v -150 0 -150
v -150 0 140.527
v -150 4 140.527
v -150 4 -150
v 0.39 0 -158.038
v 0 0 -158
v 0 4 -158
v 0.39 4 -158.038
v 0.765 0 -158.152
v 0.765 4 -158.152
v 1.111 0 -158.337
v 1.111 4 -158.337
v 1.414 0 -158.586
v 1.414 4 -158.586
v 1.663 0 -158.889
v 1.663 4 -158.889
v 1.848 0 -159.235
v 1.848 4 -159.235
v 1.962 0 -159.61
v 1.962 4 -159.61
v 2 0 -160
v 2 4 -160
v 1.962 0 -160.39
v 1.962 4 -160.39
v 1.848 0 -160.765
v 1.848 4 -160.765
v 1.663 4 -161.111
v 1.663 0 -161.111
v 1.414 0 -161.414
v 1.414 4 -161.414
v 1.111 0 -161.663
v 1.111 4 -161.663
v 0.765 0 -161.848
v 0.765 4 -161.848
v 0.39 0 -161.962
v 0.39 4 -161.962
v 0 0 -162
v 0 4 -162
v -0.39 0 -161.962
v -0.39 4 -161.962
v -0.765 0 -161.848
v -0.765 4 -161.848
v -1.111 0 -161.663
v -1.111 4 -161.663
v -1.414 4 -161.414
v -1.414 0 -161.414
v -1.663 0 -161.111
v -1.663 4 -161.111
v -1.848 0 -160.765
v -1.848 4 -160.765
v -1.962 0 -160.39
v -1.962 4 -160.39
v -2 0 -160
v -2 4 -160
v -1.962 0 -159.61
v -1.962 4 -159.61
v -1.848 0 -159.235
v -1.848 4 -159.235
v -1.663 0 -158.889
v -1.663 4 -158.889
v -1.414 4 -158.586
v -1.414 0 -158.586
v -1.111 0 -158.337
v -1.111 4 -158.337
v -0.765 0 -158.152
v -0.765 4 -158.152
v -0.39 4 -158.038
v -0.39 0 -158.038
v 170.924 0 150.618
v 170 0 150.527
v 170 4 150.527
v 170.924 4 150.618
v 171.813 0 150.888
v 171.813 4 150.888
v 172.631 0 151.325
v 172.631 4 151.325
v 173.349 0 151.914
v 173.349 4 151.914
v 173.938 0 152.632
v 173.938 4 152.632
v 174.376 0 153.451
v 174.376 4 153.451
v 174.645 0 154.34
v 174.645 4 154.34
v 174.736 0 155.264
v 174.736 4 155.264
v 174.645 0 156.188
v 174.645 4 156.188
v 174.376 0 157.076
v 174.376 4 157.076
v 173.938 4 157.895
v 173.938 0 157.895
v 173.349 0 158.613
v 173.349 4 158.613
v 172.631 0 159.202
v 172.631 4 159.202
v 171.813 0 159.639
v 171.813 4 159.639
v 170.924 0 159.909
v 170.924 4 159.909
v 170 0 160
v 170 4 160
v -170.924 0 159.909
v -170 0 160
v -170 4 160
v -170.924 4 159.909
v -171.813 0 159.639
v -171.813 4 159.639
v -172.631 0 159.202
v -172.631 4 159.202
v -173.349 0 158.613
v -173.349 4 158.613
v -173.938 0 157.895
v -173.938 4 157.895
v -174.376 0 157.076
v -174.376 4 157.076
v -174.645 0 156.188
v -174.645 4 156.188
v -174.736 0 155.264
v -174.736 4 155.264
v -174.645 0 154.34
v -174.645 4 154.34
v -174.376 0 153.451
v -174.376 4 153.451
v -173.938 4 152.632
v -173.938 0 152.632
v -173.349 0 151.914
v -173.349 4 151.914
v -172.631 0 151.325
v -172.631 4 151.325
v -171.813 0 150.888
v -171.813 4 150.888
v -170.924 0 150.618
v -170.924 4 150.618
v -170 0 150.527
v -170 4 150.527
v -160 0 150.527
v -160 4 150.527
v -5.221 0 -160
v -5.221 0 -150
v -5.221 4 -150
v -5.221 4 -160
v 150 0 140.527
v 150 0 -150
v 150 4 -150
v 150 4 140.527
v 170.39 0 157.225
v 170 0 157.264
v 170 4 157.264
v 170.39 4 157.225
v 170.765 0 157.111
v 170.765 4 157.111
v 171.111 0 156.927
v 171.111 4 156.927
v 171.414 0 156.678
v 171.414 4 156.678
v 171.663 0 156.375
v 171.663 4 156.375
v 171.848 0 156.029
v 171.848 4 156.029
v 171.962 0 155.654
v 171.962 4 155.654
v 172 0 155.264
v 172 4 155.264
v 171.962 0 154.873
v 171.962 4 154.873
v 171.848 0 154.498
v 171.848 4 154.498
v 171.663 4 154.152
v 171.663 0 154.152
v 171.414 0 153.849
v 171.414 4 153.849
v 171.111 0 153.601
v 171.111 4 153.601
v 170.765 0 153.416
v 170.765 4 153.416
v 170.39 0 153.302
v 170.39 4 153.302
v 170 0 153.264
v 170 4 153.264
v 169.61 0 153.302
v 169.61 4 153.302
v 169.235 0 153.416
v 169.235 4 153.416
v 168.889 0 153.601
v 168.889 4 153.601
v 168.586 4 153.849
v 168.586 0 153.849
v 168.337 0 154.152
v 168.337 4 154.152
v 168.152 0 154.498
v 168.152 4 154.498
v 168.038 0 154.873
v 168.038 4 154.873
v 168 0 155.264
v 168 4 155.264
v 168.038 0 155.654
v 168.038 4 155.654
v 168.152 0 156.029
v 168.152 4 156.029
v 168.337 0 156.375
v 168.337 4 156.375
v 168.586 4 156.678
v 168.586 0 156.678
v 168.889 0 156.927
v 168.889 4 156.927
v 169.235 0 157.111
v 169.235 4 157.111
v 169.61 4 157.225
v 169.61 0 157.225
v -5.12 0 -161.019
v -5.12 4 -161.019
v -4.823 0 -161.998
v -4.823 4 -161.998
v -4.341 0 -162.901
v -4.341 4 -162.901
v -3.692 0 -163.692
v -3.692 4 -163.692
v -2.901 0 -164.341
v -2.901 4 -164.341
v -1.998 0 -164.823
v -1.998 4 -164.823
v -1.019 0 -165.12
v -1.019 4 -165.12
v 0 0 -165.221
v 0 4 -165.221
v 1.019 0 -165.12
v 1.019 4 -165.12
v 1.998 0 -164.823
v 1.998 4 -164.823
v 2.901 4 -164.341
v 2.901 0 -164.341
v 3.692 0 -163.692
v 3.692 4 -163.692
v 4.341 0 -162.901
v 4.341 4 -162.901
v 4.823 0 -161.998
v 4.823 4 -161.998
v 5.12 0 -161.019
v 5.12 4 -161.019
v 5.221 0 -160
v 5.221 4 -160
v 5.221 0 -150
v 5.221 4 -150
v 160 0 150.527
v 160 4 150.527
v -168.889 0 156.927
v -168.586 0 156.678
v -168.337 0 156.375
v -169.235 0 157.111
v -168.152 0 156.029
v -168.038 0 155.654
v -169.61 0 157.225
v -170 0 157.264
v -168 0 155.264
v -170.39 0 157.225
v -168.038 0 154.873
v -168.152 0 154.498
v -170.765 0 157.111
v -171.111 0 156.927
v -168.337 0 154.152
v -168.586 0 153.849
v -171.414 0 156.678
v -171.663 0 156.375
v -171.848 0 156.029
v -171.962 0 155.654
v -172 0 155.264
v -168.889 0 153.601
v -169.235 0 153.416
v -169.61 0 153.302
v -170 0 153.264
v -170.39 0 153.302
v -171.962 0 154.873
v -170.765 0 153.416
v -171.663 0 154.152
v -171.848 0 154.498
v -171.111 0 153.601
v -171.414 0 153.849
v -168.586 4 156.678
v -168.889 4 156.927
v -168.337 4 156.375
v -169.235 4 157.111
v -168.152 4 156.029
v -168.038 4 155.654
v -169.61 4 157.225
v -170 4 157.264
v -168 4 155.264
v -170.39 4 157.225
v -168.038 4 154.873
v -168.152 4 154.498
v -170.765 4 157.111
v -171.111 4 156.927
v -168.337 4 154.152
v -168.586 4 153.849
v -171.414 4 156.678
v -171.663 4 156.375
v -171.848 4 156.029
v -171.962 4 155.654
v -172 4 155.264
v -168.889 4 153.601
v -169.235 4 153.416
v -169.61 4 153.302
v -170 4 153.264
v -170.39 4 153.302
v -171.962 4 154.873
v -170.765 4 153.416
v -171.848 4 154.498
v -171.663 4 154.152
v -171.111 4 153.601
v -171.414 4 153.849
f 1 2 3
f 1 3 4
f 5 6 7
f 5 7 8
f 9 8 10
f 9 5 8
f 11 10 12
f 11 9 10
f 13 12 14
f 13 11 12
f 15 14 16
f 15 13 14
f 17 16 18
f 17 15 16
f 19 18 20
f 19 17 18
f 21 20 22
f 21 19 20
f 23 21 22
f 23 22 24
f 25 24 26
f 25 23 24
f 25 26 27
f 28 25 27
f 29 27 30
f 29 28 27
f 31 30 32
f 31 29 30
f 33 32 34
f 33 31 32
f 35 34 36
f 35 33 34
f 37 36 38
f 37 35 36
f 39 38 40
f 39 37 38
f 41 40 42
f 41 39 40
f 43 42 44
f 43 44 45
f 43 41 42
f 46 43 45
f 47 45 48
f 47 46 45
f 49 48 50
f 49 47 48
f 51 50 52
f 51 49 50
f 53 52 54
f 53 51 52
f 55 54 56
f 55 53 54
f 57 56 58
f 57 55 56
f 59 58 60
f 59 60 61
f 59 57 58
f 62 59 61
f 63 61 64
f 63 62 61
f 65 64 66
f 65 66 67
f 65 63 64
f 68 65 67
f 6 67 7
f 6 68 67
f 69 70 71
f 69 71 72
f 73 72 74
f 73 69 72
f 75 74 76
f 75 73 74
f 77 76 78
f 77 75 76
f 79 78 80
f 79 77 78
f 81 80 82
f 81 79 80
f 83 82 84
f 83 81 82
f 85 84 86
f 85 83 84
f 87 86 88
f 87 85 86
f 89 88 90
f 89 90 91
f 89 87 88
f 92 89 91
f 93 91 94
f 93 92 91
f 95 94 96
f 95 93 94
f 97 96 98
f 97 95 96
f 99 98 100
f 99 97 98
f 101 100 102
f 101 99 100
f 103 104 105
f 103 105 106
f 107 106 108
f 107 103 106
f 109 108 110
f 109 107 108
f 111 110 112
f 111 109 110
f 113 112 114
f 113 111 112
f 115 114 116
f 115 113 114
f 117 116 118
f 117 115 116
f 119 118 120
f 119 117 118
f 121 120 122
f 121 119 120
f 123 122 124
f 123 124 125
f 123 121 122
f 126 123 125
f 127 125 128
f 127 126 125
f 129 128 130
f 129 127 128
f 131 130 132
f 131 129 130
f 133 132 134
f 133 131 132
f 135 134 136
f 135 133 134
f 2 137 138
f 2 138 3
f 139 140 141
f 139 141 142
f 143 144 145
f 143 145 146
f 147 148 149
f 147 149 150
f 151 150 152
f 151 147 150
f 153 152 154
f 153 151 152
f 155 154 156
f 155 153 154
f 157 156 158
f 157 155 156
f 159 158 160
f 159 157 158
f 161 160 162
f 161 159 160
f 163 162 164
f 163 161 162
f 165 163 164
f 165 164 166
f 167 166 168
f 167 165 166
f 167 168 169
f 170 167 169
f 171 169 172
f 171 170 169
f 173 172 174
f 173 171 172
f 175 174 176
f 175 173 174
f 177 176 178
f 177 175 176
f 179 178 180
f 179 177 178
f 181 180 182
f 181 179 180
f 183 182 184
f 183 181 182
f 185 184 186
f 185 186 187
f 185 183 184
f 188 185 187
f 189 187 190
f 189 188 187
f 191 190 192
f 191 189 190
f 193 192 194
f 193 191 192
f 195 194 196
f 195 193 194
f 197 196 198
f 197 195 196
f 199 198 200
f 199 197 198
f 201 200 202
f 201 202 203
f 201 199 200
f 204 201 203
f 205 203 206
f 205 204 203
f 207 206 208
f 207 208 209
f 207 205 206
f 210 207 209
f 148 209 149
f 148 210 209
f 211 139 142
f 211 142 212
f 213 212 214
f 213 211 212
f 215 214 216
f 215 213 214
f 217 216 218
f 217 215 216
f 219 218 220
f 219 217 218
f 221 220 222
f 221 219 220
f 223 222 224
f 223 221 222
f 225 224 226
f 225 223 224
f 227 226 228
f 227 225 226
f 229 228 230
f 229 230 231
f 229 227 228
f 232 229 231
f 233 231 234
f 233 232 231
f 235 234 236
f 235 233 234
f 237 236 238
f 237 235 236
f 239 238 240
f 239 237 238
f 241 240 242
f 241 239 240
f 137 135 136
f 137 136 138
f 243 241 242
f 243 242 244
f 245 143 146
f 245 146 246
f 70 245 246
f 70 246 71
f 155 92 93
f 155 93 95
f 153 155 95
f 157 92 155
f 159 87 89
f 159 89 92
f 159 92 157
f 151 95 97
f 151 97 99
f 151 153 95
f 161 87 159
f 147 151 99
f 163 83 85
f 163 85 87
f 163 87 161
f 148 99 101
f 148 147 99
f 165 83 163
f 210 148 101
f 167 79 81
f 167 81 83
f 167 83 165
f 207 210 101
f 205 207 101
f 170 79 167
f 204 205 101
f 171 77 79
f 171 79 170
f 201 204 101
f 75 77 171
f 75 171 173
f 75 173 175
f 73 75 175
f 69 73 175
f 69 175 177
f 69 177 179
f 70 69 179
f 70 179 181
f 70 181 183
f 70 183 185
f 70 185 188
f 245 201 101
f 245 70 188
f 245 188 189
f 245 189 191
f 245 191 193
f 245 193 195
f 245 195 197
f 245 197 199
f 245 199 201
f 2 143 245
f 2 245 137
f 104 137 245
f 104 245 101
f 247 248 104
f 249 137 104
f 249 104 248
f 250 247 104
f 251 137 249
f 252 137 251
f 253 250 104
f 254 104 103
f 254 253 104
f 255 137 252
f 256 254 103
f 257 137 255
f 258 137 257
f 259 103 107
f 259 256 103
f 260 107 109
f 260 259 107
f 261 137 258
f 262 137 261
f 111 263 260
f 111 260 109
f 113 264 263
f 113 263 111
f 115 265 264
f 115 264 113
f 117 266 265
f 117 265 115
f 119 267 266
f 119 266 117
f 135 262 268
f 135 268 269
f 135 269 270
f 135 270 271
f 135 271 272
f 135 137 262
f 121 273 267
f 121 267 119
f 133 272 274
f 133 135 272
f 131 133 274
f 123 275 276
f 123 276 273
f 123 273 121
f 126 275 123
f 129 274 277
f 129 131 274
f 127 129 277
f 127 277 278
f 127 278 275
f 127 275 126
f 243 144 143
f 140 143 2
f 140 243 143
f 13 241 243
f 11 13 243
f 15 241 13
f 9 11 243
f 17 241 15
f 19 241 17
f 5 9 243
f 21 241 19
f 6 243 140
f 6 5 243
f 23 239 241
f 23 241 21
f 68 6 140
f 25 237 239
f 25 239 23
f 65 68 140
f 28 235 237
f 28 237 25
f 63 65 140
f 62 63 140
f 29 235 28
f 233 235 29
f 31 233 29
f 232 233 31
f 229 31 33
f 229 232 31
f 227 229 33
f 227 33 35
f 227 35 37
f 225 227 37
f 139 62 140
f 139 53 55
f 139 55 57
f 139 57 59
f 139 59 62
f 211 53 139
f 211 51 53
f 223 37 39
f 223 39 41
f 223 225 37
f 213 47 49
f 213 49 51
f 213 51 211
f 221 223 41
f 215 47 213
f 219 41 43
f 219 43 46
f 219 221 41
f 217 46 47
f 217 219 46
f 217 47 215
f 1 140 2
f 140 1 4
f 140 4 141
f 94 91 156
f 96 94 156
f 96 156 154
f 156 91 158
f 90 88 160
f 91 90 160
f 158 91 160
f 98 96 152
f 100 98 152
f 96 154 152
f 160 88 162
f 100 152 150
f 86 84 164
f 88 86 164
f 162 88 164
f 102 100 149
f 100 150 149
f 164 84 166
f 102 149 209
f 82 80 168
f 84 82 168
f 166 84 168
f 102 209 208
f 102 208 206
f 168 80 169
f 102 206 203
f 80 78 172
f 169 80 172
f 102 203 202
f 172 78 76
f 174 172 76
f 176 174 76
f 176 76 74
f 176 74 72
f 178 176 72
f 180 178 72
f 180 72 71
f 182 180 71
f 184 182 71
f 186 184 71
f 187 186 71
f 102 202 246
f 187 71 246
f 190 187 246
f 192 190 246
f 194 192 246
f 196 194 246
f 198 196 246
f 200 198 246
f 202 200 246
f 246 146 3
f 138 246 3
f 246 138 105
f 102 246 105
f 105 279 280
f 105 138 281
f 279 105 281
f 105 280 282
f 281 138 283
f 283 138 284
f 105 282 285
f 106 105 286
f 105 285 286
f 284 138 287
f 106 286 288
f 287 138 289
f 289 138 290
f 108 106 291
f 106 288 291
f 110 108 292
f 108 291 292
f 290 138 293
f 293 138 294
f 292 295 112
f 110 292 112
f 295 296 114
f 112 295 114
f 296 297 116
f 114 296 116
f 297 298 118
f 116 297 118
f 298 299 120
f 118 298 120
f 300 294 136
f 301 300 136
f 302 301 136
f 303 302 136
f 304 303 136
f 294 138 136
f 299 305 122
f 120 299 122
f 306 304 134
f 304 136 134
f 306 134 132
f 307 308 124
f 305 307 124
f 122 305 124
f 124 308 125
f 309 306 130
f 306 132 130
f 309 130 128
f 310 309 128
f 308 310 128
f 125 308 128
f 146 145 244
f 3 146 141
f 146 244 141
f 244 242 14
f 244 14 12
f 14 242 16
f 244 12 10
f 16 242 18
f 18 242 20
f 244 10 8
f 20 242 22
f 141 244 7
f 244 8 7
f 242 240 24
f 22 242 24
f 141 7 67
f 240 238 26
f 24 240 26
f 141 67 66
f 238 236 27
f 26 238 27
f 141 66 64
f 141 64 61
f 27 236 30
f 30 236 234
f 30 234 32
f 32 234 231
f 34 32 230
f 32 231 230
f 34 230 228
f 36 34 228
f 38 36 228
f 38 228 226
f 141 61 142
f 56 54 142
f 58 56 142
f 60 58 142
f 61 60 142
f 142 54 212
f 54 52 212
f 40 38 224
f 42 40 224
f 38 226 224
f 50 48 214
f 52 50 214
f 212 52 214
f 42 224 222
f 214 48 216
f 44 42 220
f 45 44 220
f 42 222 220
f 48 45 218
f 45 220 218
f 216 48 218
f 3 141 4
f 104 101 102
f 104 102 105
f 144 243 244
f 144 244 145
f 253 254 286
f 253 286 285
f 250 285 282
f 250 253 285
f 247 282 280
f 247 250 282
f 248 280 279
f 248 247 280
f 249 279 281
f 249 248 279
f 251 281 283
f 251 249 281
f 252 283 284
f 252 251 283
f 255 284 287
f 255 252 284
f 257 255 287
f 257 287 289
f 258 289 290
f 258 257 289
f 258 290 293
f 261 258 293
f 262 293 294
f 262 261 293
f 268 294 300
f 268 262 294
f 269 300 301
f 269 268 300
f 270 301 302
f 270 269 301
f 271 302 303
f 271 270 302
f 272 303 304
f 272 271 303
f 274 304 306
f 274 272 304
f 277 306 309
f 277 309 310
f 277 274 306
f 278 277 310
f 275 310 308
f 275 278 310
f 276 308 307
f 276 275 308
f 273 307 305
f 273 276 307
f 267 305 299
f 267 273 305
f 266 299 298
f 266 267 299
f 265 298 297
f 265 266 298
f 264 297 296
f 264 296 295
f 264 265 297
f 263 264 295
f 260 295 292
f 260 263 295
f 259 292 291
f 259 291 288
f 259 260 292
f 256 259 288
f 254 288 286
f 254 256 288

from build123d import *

# Parameters (mm, degrees)
SKETCH1_R           = 2
BOSS_EXTRUDE1_DEPTH = 4


with BuildPart() as part:
    # Sketch1 → Boss-Extrude1 (new body)
    with BuildSketch(Plane(origin=(0, 0, 0), x_dir=(1, 0, 0), z_dir=(0, 1, 0))):
        with BuildLine():
            ThreePointArc((-5.220792314, 160), (0, 165.220792314), (5.220792314, 160))
            Line((5.220792314, 160), (5.220792314, 150))
            Line((5.220792314, 150), (150, 150))
            Line((150, 150), (150, -140.527151098))
            Line((150, -140.527151098), (160, -150.527151098))
            Line((160, -150.527151098), (170, -150.527151098))
            ThreePointArc((170, -150.527151098), (174.736424451, -155.263575549), (170, -160))
            Line((170, -160), (-170, -160))
            ThreePointArc((-170, -160), (-174.736424451, -155.263575549), (-170, -150.527151098))
            Line((-170, -150.527151098), (-160, -150.527151098))
            Line((-160, -150.527151098), (-150, -140.527151098))
            Line((-150, -140.527151098), (-150, 150))
            Line((-150, 150), (-5.220792314, 150))
            Line((-5.220792314, 150), (-5.220792314, 160))
        make_face()
        with Locations(Location((170, -155.263575549, 0), (0, 0, 270))):
            Circle(SKETCH1_R, mode=Mode.SUBTRACT)
        with Locations(Location((-170, -155.263575549, 0), (0, 0, 270))):
            Circle(SKETCH1_R, mode=Mode.SUBTRACT)
        with Locations(Location((0, 160, 0), (0, 0, 270))):
            Circle(SKETCH1_R, mode=Mode.SUBTRACT)
    extrude(amount=BOSS_EXTRUDE1_DEPTH)


solid = part.part
